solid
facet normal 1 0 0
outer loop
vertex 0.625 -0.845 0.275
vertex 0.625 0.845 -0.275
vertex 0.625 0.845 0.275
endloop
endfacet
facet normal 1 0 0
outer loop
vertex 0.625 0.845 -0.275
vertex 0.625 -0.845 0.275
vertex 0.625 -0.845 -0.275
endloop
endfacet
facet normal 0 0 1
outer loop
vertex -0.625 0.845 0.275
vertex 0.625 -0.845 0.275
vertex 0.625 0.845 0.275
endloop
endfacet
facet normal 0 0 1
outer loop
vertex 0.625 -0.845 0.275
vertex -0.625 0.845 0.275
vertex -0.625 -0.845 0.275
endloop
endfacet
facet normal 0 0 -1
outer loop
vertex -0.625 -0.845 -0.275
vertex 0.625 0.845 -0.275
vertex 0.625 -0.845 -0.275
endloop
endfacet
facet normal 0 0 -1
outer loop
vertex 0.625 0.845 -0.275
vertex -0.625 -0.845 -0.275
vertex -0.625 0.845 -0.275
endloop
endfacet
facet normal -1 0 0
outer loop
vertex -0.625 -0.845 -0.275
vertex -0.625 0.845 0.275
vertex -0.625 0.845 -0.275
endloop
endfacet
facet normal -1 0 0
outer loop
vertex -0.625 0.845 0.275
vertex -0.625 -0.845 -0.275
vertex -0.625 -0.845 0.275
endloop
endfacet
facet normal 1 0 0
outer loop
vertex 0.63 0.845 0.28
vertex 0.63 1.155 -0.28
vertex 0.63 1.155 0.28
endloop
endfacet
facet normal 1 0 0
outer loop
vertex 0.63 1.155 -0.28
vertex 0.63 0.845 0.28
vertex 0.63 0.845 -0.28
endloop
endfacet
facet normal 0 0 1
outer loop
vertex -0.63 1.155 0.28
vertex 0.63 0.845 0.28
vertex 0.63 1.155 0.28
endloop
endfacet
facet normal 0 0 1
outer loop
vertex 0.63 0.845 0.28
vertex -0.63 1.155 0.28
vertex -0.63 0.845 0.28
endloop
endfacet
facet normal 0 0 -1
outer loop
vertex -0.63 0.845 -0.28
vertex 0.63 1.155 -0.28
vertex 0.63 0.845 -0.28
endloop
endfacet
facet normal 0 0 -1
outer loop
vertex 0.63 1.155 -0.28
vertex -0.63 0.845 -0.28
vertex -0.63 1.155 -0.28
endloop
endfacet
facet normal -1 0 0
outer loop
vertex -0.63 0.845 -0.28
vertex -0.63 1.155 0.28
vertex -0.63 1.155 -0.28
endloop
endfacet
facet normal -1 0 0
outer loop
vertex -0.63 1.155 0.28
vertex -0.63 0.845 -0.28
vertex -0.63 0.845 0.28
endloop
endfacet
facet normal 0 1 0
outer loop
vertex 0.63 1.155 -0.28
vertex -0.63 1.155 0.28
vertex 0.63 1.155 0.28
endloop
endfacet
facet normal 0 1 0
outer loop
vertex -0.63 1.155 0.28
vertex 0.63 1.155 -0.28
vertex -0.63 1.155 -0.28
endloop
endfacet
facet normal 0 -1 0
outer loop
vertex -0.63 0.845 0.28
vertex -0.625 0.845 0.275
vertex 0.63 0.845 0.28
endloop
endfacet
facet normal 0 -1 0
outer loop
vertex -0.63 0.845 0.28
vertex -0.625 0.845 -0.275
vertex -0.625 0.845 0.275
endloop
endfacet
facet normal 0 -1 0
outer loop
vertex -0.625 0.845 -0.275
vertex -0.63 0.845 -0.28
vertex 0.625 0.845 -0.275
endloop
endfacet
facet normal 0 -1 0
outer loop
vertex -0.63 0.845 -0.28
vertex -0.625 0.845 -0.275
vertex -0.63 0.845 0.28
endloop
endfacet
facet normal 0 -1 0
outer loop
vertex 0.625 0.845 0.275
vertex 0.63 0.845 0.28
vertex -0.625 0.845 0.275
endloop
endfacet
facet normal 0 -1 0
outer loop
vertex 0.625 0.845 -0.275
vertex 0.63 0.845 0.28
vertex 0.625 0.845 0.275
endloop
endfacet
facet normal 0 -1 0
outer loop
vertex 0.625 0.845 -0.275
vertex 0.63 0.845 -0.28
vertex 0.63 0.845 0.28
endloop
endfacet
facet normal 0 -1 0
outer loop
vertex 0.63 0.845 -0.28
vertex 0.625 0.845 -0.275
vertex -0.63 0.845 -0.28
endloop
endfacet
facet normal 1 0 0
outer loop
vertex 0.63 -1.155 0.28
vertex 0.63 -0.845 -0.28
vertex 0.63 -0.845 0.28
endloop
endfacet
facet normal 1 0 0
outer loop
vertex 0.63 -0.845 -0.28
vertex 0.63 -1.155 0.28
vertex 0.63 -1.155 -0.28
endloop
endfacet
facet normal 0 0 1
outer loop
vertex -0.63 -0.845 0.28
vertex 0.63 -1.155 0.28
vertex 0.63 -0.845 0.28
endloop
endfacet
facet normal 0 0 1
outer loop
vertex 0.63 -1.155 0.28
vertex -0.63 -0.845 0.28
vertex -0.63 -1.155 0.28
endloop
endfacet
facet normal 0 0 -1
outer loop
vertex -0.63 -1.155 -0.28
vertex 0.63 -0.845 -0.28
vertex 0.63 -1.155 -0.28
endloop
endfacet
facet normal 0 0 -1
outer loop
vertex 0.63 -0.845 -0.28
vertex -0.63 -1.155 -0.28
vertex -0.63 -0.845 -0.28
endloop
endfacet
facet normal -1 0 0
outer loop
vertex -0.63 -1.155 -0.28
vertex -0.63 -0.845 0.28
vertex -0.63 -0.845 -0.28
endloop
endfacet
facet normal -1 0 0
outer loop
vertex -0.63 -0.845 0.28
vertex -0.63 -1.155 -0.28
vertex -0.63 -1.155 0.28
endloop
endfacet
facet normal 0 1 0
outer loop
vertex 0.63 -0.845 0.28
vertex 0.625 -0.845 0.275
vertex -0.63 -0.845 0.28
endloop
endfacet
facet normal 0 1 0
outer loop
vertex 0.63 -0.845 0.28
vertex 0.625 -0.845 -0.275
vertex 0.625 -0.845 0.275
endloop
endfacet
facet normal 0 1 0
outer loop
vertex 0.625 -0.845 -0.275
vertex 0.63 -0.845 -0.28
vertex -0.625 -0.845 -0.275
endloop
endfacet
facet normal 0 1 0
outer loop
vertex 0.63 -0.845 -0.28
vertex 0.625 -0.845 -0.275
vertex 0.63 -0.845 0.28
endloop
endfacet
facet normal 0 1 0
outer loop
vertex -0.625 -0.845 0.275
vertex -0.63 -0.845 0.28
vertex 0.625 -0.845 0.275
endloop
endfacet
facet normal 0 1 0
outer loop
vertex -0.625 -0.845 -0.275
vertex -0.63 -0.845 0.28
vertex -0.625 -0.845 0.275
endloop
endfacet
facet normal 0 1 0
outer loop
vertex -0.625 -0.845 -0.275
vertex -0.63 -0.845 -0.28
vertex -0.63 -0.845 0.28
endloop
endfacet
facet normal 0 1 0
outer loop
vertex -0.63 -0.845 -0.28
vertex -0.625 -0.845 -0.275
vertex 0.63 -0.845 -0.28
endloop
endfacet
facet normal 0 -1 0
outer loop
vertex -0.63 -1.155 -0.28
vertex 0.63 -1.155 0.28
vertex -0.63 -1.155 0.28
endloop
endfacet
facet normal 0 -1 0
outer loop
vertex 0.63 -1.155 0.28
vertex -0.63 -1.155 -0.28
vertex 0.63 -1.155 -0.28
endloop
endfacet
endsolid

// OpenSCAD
// @brief  : SMD 0805
// @author : nimisbert
// @dimens : [mm]

L = 2.00; // length
W = 1.25; // width
H = 0.55; // height
C = 0.30; // Wrap around length

color("#555555")
cube([W,L,H],true);

color("#bbbbbb")
translate([0,L/2,0])
cube([W+0.01,C+0.01,H+0.01],true);

translate([0,-L/2,0])
color("#bbbbbb")
cube([W+0.01,C+0.01,H+0.01],true);
